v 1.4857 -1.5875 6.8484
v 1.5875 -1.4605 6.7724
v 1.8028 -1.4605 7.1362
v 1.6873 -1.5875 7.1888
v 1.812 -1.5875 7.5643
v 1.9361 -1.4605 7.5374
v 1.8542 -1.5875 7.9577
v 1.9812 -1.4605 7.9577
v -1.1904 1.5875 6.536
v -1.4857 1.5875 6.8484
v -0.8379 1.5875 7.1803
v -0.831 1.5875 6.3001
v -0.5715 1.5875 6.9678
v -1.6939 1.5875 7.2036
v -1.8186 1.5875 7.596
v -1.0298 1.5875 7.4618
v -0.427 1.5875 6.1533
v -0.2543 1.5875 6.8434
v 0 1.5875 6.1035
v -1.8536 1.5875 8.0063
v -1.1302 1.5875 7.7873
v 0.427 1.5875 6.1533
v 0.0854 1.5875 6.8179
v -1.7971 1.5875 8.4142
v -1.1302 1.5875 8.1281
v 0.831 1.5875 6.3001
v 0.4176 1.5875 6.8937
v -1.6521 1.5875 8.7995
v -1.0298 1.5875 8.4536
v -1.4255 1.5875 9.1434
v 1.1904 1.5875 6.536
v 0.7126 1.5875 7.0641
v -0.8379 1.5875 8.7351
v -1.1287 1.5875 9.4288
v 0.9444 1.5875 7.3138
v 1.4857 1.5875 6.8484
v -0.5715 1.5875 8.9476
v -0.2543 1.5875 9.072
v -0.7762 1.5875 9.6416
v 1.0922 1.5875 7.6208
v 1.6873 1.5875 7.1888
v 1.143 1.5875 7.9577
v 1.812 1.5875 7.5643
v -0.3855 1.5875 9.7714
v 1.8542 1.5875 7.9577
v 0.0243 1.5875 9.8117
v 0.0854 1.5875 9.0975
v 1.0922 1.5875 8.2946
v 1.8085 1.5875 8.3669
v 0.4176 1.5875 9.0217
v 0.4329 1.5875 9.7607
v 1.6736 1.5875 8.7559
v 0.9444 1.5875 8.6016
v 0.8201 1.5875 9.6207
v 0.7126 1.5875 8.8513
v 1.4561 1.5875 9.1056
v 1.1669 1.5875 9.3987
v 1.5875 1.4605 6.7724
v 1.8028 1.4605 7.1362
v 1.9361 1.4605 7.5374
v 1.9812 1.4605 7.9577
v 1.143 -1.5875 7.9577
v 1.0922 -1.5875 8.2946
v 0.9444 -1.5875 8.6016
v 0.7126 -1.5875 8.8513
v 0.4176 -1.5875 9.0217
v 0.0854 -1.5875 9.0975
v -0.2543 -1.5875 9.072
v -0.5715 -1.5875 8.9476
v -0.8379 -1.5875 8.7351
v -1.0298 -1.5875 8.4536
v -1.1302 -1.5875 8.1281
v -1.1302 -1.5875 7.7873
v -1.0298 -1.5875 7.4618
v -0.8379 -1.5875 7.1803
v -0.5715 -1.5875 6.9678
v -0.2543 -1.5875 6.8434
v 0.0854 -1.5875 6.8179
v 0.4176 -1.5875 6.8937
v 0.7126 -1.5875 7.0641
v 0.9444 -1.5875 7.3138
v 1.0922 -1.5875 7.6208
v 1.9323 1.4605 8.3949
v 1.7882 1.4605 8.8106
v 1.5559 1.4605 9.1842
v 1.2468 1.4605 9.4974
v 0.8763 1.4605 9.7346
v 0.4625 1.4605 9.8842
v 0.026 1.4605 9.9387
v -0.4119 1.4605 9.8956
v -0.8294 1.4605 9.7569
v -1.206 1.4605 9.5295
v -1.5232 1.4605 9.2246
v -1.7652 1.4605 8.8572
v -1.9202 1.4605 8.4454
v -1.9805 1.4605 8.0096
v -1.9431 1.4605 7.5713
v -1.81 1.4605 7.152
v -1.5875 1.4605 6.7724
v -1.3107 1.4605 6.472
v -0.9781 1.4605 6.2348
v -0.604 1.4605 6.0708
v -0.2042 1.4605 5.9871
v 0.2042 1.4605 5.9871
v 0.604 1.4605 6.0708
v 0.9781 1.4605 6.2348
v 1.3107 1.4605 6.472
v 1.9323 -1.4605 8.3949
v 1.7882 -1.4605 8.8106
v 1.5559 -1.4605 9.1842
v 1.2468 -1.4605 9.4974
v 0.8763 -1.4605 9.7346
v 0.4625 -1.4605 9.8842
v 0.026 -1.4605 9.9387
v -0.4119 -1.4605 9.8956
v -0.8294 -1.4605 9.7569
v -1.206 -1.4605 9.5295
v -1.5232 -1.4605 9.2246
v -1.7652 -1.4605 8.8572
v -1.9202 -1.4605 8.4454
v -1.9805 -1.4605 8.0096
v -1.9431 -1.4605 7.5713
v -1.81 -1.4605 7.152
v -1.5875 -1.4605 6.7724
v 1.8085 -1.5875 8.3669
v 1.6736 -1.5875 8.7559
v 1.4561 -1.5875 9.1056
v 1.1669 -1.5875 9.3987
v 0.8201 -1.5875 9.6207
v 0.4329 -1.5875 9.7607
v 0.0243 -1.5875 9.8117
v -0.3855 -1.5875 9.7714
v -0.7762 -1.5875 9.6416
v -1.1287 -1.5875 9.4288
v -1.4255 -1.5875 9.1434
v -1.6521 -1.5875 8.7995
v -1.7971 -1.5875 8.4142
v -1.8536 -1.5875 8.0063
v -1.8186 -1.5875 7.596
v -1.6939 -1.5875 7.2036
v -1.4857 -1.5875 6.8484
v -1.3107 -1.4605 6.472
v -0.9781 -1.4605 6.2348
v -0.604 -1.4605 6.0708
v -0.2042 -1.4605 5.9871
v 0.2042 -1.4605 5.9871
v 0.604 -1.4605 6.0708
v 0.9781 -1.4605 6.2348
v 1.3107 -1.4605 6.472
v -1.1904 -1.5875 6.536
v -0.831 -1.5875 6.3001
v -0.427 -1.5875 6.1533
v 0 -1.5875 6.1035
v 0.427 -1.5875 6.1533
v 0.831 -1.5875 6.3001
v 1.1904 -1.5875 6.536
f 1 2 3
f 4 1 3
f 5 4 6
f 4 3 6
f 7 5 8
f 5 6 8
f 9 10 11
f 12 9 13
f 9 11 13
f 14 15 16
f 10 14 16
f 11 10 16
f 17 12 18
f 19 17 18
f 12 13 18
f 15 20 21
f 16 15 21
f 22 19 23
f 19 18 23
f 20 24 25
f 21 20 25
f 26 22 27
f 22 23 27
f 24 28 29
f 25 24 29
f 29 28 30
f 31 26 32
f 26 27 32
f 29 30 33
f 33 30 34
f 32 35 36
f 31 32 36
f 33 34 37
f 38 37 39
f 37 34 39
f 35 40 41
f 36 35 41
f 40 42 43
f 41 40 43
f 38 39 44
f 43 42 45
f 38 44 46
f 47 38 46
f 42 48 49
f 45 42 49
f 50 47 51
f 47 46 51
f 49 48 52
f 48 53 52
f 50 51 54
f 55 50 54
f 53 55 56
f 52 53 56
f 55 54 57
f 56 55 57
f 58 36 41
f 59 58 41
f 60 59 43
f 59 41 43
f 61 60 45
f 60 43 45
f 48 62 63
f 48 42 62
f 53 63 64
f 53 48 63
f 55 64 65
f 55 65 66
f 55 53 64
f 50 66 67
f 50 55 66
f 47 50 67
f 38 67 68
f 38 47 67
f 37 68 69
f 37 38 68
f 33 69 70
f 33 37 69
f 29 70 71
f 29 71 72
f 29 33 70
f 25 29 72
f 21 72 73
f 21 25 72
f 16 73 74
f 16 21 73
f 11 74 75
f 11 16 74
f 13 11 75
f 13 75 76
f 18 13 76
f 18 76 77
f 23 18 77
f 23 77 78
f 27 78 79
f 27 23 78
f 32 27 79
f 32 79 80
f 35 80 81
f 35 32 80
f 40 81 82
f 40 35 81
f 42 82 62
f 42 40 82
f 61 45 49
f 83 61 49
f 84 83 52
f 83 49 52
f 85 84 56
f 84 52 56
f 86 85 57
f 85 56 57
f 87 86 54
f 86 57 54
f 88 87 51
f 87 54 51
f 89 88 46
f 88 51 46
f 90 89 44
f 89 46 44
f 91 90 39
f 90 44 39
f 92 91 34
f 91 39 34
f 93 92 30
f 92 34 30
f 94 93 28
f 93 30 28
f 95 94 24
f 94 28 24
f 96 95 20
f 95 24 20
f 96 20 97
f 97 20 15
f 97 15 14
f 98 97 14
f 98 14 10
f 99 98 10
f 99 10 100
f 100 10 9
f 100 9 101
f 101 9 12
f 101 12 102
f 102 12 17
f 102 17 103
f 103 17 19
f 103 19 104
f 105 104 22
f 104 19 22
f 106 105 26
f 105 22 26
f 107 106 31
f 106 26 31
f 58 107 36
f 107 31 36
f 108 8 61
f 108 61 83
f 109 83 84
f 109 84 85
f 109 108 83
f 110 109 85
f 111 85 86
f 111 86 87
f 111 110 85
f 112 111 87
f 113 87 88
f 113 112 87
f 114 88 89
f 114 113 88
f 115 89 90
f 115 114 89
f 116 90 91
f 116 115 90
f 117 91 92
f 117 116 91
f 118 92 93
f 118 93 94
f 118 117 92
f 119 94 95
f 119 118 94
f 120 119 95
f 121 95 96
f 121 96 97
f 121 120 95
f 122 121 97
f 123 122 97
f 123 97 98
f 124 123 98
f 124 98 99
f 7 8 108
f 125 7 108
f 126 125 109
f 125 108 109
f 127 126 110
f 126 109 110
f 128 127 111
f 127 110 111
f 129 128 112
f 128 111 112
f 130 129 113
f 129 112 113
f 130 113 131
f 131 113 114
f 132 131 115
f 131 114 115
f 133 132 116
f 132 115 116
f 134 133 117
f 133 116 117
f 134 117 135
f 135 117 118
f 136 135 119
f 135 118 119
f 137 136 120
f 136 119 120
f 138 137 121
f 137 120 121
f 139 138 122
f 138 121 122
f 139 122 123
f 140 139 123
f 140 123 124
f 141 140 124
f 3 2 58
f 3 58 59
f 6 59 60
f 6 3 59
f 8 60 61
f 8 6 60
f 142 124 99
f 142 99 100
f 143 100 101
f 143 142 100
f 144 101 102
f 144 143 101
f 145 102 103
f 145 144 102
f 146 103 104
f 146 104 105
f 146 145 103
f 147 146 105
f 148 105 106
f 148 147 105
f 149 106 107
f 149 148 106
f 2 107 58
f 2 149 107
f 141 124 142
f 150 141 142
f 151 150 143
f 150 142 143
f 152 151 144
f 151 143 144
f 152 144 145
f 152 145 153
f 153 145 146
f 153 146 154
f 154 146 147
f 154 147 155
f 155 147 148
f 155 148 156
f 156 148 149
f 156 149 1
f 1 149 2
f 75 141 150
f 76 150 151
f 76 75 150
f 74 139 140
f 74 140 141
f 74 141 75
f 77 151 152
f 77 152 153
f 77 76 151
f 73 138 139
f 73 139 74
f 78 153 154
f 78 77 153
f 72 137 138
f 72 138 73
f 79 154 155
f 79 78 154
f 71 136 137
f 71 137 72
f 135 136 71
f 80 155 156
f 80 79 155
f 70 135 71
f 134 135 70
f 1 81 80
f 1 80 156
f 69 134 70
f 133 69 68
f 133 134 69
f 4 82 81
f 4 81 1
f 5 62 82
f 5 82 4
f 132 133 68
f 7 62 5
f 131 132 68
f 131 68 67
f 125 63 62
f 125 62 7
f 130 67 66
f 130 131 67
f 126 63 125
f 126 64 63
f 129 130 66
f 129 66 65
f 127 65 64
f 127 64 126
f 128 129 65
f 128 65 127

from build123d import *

# Parameters (mm, degrees)
F0_R     = 1.143
F1_DEPTH = 1.5875
F2_SIZE2 = 0.127
F2_SIZE  = 0.127
F3_SIZE2 = 0.127
F3_SIZE  = 0.127


with BuildPart() as f1:
    # F0 (on Front) → F1 (new body, symmetric)
    with BuildSketch(Plane.XZ):
        with BuildLine():
            ThreePointArc((1.5875, 6.772374), (1.880201, 7.3332), (1.9812, 7.957699))
            ThreePointArc((1.9812, 7.957699), (-0.624499, 9.8379), (-1.5875, 6.772374))
            ThreePointArc((-1.5875, 6.772374), (0, 5.976499), (1.5875, 6.772374))
        make_face()
        with Locations((0, 7.957699)):
            Circle(F0_R, mode=Mode.SUBTRACT)
    extrude(amount=F1_DEPTH, both=True)

    # F2
    f2_edges = [f1.edges().sort_by_distance(p)[0] for p in [
        (-0.624499, -1.5875, 9.8379),
    ]]
    chamfer(f2_edges, length=F2_SIZE, length2=F2_SIZE2)

    # F3
    f3_edges = [f1.edges().sort_by_distance(p)[0] for p in [
        (-0.624499, 1.5875, 9.8379),
    ]]
    chamfer(f3_edges, length=F3_SIZE, length2=F3_SIZE2)


solid = f1.part
